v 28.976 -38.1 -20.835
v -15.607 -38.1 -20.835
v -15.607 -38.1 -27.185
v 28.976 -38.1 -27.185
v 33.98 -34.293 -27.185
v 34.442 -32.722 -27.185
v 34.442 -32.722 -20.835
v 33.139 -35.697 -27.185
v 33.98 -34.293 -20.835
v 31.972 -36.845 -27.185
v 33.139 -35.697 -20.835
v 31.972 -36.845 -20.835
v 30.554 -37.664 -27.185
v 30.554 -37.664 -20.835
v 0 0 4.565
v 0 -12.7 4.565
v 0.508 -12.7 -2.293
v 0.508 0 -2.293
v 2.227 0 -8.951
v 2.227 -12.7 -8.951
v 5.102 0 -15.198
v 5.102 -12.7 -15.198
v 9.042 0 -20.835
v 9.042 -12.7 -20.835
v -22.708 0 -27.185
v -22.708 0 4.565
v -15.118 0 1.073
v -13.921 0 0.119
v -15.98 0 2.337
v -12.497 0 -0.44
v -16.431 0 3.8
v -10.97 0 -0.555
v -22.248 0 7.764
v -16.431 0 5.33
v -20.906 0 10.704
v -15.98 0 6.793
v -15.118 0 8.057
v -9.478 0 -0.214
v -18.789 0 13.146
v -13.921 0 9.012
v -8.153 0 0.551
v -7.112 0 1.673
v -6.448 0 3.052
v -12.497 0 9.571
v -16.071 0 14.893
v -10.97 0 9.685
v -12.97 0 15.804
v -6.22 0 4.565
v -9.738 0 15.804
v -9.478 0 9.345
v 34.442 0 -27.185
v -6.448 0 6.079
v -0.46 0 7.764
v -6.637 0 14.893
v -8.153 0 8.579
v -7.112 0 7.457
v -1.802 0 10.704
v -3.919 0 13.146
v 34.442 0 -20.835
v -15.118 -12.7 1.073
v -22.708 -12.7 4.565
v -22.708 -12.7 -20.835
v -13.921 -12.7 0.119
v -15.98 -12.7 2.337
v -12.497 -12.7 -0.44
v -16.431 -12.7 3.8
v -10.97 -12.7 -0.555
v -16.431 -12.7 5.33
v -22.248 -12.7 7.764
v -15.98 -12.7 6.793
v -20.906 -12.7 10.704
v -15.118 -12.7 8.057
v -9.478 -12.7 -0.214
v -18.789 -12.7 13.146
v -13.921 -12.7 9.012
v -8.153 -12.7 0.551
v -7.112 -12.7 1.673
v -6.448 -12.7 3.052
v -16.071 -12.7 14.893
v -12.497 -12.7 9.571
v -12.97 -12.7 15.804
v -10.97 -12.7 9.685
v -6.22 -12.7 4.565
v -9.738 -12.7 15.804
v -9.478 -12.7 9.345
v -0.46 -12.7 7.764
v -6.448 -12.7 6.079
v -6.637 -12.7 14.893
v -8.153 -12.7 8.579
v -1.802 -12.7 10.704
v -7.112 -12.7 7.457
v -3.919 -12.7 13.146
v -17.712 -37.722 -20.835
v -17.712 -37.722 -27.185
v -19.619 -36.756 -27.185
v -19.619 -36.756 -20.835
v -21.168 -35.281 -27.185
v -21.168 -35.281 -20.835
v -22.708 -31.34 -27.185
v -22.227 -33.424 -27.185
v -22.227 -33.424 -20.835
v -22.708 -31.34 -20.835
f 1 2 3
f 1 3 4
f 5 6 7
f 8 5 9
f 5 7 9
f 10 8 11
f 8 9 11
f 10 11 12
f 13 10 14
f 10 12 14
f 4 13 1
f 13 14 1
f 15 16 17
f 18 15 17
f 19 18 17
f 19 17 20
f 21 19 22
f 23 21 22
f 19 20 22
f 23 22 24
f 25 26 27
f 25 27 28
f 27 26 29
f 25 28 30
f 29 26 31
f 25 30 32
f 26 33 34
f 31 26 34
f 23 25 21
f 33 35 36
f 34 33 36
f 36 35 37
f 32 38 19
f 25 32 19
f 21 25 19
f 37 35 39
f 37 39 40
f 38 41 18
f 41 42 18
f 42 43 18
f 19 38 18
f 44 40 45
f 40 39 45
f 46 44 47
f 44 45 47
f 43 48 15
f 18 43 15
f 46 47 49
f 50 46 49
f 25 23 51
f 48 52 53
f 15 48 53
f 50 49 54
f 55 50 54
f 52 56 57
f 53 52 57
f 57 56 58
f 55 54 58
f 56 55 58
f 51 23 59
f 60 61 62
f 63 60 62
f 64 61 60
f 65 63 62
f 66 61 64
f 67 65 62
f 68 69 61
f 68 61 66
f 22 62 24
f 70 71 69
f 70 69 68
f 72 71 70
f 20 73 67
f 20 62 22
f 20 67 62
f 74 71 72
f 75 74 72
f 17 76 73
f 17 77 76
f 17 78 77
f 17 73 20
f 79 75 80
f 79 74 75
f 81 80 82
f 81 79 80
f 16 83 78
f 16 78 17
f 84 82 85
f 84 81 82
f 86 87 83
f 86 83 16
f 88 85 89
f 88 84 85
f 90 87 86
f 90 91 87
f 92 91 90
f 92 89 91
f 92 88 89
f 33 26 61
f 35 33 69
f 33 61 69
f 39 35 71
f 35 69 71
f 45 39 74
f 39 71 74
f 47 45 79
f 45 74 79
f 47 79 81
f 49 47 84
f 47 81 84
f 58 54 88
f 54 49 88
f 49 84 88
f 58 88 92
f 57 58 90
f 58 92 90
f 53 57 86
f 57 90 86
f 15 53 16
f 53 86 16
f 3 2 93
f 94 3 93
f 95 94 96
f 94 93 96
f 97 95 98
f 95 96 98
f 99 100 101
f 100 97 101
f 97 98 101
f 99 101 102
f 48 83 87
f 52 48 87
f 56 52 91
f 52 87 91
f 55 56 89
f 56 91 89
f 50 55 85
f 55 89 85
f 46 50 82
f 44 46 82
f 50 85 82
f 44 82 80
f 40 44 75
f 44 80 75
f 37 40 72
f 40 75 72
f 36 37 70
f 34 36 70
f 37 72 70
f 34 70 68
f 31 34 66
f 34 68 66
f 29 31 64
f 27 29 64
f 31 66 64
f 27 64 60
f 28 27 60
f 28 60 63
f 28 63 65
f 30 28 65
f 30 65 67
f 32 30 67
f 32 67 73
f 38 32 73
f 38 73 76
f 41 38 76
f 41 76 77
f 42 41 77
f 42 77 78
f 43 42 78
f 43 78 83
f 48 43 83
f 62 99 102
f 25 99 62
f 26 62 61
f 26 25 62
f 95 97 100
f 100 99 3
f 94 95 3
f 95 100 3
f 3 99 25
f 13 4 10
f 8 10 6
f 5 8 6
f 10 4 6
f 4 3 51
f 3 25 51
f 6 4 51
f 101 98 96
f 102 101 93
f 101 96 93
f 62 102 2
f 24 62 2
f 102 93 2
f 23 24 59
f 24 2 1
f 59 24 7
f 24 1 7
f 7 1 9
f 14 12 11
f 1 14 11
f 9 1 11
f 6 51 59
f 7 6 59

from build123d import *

# Parameters (mm, degrees)
F0_W     = 57.15
F0_H     = 44.45
F1_DEPTH = 38.1
F3_DEPTH = 50.8
F4_R     = 5.1343253719
F5_DEPTH = 50.8
F6_R     = 5.1343253719
F7_DEPTH = 25.4
F9_DEPTH = 25.4


with BuildPart() as f1:
    # F0 (on Front) → F1 (new body)
    with BuildSketch(Plane.XZ):
        with Locations((5.8669857811, -4.9598356709)):
            Rectangle(F0_W, F0_H)
    extrude(amount=F1_DEPTH)

    # F2 (on face) → F3 (cut)
    with BuildSketch(Plane.XZ.offset(38.1)):
        with BuildLine():
            Line((-22.7080142189, 17.2651643291), (-22.7080142189, 4.5651643291))
            ThreePointArc((-22.7080142189, 4.5651643291), (-11.3540071095, 15.9191714386), (0, 4.5651643291))
            ThreePointArc((0, 4.5651643291), (2.2272511589, -8.9513703214), (9.0419857811, -20.8348356709))
            Line((9.0419857811, -20.8348356709), (34.4419857811, -20.8348356709))
            Line((34.4419857811, -20.8348356709), (34.4419857811, 17.2651643291))
            Line((34.4419857811, 17.2651643291), (-22.7080142189, 17.2651643291))
        make_face()
    extrude(amount=-F3_DEPTH, mode=Mode.SUBTRACT)

    # F4 (on face) → F5 (cut)
    with BuildSketch(Plane.XZ.offset(38.1)):
        with Locations((-11.3540071095, 4.5651643291)):
            Circle(F4_R)
    extrude(amount=-F5_DEPTH, mode=Mode.SUBTRACT)

    # F6 (on face) → F7 (cut)
    with BuildSketch(Plane.XZ.offset(38.1)):
        with BuildLine():
            Line((-22.7080142189, -20.8348356709), (9.0419857811, -20.8348356709))
            ThreePointArc((9.0419857811, -20.8348356709), (2.2272511589, -8.9513703214), (0, 4.5651643291))
            ThreePointArc((0, 4.5651643291), (-11.3540071095, 15.9191714386), (-22.7080142189, 4.5651643291))
            Line((-22.7080142189, 4.5651643291), (-22.7080142189, -20.8348356709))
        make_face()
        with Locations((-11.3540071095, 4.5651643291)):
            Circle(F6_R, mode=Mode.SUBTRACT)
    extrude(amount=-F7_DEPTH, mode=Mode.SUBTRACT)

    # F8 (on face) → F9 (cut)
    with BuildSketch(Plane.XY.offset(-20.8348356709)):
        with BuildLine():
            ThreePointArc((-15.6066697437, -38.1), (-20.4472184025, -36.0749113012), (-22.7080142189, -31.3398613719))
            Line((-22.7080142189, -31.3398613719), (-22.7080142189, -38.1))
            Line((-22.7080142189, -38.1), (-15.6066697437, -38.1))
        make_face()
        with BuildLine():
            ThreePointArc((34.4419857811, -32.7223523103), (32.5917045845, -36.3084613898), (28.9758909494, -38.1))
            Line((28.9758909494, -38.1), (34.4419857811, -38.1))
            Line((34.4419857811, -38.1), (34.4419857811, -32.7223523103))
        make_face()
    extrude(amount=-F9_DEPTH, mode=Mode.SUBTRACT)


solid = f1.part
